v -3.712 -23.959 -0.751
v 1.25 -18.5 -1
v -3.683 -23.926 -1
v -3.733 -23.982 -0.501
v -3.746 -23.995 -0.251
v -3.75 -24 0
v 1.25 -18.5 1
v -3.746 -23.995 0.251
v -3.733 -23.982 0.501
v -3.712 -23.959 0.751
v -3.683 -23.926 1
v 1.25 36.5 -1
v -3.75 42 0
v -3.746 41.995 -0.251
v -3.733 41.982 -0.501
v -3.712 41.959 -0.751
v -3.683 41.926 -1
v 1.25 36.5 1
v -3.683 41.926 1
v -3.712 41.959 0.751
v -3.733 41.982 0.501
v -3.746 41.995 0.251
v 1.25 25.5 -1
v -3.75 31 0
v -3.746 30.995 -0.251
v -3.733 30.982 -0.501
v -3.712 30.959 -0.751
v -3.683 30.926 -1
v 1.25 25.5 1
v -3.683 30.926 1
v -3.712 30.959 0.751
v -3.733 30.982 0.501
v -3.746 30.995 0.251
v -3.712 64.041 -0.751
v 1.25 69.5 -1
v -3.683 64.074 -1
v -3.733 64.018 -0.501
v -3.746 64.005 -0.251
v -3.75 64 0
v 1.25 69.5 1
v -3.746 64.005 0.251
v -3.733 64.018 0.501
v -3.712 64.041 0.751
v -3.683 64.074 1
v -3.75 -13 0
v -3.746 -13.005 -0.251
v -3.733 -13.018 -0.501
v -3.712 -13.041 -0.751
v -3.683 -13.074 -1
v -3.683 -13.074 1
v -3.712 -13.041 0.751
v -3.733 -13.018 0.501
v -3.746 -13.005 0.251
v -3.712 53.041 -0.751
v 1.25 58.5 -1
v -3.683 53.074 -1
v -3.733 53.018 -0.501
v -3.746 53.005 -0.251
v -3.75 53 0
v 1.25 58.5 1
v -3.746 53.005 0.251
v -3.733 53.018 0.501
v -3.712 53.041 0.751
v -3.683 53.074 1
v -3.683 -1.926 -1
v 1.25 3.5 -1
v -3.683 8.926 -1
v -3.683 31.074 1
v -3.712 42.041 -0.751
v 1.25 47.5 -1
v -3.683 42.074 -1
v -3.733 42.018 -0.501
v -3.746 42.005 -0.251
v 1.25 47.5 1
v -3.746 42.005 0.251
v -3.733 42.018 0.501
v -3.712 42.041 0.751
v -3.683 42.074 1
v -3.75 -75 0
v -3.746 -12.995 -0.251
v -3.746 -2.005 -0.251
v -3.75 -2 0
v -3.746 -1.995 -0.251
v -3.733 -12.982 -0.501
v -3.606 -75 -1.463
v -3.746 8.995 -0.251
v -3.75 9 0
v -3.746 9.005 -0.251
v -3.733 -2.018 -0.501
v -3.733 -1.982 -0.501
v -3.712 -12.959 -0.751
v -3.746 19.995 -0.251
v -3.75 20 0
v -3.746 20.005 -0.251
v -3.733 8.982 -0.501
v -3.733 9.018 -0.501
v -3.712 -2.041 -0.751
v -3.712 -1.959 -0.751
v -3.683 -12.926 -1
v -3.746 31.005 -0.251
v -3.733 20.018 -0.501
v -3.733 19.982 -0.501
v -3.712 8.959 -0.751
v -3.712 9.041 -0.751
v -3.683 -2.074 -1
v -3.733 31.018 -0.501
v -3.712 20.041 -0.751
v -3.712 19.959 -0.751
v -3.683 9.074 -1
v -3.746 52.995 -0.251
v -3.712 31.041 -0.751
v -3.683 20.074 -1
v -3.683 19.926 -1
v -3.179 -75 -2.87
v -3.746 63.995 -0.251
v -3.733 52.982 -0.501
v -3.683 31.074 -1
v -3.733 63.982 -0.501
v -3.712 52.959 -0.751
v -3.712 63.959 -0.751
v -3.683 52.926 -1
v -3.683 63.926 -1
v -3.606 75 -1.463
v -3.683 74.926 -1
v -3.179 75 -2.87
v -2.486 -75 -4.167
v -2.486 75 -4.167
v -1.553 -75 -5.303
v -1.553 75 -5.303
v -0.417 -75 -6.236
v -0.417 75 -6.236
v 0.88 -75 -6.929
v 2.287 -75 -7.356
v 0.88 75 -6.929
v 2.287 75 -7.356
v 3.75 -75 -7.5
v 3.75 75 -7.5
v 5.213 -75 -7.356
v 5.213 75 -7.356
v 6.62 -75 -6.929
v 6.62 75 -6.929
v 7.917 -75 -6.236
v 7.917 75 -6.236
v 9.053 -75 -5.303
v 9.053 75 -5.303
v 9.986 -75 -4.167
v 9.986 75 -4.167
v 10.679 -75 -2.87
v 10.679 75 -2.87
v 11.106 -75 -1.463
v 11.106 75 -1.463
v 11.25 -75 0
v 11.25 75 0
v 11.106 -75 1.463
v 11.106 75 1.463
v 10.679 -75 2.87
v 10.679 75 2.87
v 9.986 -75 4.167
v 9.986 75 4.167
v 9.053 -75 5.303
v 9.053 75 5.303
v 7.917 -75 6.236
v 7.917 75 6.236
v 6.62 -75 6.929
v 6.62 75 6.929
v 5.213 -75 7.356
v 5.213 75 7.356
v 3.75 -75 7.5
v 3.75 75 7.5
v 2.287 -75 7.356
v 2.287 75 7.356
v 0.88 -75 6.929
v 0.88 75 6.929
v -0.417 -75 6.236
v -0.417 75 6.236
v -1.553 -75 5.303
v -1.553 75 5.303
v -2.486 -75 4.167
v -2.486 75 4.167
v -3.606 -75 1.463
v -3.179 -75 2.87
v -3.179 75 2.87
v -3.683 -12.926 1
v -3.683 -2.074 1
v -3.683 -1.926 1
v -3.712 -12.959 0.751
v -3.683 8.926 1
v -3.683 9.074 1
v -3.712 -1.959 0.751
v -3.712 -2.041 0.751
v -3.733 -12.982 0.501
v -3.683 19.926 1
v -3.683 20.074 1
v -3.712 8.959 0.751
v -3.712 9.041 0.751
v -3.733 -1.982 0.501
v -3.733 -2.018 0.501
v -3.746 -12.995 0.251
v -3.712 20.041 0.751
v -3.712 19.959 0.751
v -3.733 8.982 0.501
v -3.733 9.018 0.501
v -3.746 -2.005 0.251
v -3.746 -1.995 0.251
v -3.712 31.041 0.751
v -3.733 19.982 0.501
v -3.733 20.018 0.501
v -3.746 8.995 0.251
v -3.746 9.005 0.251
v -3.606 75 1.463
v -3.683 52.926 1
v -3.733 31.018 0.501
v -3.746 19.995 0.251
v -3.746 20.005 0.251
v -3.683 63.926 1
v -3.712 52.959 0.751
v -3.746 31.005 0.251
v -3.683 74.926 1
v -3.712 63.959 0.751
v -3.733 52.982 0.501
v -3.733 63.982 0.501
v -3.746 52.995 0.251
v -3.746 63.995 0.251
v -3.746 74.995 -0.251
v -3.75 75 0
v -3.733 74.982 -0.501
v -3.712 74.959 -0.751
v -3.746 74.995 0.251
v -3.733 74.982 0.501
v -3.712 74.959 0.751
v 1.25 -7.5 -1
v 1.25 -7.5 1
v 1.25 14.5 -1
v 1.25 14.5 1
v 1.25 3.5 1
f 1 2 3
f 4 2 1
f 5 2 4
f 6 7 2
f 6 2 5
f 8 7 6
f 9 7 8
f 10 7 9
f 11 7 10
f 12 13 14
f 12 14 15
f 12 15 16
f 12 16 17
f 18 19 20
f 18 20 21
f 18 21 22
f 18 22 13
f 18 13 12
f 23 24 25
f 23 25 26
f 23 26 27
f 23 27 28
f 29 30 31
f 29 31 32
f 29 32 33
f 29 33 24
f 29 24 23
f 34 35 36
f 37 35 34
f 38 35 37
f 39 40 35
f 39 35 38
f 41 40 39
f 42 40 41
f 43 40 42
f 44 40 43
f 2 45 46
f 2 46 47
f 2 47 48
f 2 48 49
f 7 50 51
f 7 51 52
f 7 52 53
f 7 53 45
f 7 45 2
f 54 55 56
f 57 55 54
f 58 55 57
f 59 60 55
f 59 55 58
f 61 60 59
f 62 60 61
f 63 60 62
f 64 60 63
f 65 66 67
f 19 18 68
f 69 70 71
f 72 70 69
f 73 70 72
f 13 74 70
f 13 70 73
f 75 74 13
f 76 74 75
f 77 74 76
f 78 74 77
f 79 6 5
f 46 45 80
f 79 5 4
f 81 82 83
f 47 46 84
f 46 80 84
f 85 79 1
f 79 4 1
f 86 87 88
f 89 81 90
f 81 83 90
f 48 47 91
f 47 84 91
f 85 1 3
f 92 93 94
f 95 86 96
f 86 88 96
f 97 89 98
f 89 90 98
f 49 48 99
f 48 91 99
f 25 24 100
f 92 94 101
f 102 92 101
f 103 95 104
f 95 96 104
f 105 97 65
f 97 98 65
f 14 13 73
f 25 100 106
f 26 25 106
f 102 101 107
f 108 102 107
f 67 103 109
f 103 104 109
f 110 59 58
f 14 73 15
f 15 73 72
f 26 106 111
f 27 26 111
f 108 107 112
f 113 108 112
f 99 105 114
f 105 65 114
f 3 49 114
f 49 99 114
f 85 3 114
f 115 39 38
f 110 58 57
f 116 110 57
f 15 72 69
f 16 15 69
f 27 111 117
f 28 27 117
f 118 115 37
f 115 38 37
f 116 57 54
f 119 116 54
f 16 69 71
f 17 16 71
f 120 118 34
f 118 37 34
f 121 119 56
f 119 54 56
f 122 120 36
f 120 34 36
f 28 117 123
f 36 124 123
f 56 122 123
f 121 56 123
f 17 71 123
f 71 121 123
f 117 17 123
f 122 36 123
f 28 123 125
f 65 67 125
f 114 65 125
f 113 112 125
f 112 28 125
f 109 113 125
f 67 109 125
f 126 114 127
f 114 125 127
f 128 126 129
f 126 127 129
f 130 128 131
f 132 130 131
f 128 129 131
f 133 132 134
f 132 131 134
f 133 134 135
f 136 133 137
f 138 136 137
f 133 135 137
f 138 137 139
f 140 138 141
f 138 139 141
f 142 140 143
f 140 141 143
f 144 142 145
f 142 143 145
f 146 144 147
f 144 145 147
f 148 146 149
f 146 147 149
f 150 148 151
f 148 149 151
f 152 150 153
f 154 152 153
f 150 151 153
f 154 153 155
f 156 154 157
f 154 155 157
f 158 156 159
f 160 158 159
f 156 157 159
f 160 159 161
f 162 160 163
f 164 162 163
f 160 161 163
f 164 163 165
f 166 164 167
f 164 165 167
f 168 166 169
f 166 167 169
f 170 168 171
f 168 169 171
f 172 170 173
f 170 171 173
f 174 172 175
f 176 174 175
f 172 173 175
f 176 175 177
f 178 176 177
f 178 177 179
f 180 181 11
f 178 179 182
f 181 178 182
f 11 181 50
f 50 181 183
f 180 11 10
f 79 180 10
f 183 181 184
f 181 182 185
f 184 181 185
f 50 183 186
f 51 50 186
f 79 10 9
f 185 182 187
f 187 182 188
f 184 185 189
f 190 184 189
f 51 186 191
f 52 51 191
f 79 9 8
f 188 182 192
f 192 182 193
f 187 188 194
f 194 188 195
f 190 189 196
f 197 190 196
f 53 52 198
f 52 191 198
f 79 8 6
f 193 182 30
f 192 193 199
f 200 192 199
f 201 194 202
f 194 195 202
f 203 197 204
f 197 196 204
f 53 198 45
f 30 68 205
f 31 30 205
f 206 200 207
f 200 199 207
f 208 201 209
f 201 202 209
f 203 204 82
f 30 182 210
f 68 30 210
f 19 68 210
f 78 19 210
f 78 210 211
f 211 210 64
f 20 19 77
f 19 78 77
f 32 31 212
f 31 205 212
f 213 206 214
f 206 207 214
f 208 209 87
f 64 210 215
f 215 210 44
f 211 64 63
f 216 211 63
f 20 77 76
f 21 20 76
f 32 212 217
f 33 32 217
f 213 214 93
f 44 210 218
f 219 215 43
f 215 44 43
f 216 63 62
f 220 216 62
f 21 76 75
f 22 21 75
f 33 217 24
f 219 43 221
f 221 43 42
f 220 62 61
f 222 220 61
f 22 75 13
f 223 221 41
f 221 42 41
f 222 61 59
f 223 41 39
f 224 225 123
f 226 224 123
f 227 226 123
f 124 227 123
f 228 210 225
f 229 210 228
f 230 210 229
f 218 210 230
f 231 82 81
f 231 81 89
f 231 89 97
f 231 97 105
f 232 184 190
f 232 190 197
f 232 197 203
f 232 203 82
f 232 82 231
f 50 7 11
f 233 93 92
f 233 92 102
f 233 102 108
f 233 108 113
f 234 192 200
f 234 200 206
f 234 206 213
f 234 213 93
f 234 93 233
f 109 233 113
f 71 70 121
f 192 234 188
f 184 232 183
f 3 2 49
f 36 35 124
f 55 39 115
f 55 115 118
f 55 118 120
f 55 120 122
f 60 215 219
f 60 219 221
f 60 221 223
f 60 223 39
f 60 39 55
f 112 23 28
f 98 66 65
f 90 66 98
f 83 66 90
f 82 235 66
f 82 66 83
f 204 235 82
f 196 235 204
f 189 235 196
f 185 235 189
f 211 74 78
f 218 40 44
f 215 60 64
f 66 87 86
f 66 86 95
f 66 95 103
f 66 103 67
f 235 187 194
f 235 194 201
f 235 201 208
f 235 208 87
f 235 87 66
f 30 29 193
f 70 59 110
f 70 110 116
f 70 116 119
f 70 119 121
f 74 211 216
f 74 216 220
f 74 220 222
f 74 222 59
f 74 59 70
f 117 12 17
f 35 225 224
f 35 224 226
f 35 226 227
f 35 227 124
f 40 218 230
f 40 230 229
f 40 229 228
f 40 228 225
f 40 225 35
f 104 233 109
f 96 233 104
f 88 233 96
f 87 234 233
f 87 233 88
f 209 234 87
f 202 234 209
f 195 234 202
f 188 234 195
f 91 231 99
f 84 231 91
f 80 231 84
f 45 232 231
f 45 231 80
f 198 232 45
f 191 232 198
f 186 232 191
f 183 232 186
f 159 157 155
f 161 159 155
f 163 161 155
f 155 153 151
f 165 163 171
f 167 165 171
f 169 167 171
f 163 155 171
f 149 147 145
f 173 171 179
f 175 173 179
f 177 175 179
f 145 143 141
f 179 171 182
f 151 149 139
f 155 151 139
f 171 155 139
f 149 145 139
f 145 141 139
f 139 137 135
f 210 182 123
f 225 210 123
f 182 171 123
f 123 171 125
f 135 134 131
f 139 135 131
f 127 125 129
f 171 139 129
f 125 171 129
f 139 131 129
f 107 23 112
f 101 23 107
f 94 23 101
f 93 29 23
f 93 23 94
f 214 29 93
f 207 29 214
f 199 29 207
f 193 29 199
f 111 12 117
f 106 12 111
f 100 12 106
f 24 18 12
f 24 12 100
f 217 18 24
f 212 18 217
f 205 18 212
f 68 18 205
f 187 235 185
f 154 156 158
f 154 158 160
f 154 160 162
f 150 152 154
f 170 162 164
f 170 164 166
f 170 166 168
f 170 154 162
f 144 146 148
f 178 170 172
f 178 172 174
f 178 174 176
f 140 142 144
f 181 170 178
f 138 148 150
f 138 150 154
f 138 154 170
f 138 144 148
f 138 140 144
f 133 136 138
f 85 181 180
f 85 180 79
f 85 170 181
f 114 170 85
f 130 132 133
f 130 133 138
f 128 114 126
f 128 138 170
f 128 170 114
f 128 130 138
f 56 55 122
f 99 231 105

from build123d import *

# Parameters (mm, degrees)
SKETCH_1_W          = 7.5
SKETCH_1_H          = 150
CUT_EXTRUDE_1_DEPTH = 1


with BuildPart() as part:
    # 草图1 → 旋转1 (revolve)
    with BuildSketch(Plane.XY):
        Rectangle(SKETCH_1_W, SKETCH_1_H)
    revolve(axis=Axis((3.75, 75, 0), (0, -1, 0)))

    # 草图2 → 切除-拉伸1 (cut, symmetric)
    with BuildSketch(Plane.XY):
        Polygon((1.25, 69.5), (-3.75, 75), (-27.95, 75), (-27.95, -24), (-3.75, -24), (1.25, -18.5), (-3.75, -13), (1.25, -7.5), (-3.75, -2), (1.25, 3.5), (-3.75, 9), (1.25, 14.5), (-3.75, 20), (1.25, 25.5), (-3.75, 31), (1.25, 36.5), (-3.75, 42), (1.25, 47.5), (-3.75, 53), (1.25, 58.5), (-3.75, 64), align=None)
    extrude(amount=CUT_EXTRUDE_1_DEPTH, both=True, mode=Mode.SUBTRACT)


solid = part.part
